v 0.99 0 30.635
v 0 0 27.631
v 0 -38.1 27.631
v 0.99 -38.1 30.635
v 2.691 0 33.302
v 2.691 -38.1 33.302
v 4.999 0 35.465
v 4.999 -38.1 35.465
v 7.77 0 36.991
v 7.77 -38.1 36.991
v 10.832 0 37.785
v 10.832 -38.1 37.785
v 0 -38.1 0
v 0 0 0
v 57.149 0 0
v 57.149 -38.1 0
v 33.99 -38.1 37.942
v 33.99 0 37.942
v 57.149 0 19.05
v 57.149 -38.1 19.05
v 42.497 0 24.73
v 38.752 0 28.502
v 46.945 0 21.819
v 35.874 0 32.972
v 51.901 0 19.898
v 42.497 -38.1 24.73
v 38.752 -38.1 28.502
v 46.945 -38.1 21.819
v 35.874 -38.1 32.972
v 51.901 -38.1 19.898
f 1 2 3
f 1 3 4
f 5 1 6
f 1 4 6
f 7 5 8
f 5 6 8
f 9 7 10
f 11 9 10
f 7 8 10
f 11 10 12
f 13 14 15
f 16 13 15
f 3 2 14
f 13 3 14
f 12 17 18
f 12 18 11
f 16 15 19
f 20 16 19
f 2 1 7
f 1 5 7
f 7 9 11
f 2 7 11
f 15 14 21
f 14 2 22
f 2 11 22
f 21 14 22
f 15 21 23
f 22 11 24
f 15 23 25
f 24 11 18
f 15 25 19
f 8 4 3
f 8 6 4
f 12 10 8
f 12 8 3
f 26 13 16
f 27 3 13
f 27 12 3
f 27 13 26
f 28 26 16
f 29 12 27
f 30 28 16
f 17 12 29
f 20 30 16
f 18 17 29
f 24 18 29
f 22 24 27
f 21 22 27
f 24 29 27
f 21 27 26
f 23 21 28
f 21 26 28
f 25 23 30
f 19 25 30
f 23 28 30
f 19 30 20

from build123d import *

# Parameters (mm, degrees)
F1_DEPTH = 38.1
F3_DEPTH = 38.1
F5_DEPTH = 38.1


with BuildPart() as f1:
    # F0 (on Front) → F1 (new body)
    with BuildSketch(Plane.XZ):
        Polygon((57.148678, 38.1), (0, 37.711234), (0, 0), (57.148678, 0), align=None)
    extrude(amount=F1_DEPTH)

    # F2 (on face) → F3 (cut)
    with BuildSketch(Plane.XZ.offset(38.1)):
        with BuildLine():
            ThreePointArc((0, 27.63082), (3.777567, 34.45559), (10.83186, 37.78492))
            Line((10.83186, 37.78492), (0, 37.711234))
            Line((0, 37.711234), (0, 27.63082))
        make_face()
    extrude(amount=-F3_DEPTH, mode=Mode.SUBTRACT)

    # F4 (on face) → F5 (cut)
    with BuildSketch(Plane.XZ.offset(38.1)):
        with BuildLine():
            Line((57.148678, 38.1), (33.990269, 37.94246))
            ThreePointArc((33.990269, 37.94246), (42.496702, 24.729622), (57.148678, 19.05))
            Line((57.148678, 19.05), (57.148678, 38.1))
        make_face()
    extrude(amount=-F5_DEPTH, mode=Mode.SUBTRACT)


solid = f1.part
